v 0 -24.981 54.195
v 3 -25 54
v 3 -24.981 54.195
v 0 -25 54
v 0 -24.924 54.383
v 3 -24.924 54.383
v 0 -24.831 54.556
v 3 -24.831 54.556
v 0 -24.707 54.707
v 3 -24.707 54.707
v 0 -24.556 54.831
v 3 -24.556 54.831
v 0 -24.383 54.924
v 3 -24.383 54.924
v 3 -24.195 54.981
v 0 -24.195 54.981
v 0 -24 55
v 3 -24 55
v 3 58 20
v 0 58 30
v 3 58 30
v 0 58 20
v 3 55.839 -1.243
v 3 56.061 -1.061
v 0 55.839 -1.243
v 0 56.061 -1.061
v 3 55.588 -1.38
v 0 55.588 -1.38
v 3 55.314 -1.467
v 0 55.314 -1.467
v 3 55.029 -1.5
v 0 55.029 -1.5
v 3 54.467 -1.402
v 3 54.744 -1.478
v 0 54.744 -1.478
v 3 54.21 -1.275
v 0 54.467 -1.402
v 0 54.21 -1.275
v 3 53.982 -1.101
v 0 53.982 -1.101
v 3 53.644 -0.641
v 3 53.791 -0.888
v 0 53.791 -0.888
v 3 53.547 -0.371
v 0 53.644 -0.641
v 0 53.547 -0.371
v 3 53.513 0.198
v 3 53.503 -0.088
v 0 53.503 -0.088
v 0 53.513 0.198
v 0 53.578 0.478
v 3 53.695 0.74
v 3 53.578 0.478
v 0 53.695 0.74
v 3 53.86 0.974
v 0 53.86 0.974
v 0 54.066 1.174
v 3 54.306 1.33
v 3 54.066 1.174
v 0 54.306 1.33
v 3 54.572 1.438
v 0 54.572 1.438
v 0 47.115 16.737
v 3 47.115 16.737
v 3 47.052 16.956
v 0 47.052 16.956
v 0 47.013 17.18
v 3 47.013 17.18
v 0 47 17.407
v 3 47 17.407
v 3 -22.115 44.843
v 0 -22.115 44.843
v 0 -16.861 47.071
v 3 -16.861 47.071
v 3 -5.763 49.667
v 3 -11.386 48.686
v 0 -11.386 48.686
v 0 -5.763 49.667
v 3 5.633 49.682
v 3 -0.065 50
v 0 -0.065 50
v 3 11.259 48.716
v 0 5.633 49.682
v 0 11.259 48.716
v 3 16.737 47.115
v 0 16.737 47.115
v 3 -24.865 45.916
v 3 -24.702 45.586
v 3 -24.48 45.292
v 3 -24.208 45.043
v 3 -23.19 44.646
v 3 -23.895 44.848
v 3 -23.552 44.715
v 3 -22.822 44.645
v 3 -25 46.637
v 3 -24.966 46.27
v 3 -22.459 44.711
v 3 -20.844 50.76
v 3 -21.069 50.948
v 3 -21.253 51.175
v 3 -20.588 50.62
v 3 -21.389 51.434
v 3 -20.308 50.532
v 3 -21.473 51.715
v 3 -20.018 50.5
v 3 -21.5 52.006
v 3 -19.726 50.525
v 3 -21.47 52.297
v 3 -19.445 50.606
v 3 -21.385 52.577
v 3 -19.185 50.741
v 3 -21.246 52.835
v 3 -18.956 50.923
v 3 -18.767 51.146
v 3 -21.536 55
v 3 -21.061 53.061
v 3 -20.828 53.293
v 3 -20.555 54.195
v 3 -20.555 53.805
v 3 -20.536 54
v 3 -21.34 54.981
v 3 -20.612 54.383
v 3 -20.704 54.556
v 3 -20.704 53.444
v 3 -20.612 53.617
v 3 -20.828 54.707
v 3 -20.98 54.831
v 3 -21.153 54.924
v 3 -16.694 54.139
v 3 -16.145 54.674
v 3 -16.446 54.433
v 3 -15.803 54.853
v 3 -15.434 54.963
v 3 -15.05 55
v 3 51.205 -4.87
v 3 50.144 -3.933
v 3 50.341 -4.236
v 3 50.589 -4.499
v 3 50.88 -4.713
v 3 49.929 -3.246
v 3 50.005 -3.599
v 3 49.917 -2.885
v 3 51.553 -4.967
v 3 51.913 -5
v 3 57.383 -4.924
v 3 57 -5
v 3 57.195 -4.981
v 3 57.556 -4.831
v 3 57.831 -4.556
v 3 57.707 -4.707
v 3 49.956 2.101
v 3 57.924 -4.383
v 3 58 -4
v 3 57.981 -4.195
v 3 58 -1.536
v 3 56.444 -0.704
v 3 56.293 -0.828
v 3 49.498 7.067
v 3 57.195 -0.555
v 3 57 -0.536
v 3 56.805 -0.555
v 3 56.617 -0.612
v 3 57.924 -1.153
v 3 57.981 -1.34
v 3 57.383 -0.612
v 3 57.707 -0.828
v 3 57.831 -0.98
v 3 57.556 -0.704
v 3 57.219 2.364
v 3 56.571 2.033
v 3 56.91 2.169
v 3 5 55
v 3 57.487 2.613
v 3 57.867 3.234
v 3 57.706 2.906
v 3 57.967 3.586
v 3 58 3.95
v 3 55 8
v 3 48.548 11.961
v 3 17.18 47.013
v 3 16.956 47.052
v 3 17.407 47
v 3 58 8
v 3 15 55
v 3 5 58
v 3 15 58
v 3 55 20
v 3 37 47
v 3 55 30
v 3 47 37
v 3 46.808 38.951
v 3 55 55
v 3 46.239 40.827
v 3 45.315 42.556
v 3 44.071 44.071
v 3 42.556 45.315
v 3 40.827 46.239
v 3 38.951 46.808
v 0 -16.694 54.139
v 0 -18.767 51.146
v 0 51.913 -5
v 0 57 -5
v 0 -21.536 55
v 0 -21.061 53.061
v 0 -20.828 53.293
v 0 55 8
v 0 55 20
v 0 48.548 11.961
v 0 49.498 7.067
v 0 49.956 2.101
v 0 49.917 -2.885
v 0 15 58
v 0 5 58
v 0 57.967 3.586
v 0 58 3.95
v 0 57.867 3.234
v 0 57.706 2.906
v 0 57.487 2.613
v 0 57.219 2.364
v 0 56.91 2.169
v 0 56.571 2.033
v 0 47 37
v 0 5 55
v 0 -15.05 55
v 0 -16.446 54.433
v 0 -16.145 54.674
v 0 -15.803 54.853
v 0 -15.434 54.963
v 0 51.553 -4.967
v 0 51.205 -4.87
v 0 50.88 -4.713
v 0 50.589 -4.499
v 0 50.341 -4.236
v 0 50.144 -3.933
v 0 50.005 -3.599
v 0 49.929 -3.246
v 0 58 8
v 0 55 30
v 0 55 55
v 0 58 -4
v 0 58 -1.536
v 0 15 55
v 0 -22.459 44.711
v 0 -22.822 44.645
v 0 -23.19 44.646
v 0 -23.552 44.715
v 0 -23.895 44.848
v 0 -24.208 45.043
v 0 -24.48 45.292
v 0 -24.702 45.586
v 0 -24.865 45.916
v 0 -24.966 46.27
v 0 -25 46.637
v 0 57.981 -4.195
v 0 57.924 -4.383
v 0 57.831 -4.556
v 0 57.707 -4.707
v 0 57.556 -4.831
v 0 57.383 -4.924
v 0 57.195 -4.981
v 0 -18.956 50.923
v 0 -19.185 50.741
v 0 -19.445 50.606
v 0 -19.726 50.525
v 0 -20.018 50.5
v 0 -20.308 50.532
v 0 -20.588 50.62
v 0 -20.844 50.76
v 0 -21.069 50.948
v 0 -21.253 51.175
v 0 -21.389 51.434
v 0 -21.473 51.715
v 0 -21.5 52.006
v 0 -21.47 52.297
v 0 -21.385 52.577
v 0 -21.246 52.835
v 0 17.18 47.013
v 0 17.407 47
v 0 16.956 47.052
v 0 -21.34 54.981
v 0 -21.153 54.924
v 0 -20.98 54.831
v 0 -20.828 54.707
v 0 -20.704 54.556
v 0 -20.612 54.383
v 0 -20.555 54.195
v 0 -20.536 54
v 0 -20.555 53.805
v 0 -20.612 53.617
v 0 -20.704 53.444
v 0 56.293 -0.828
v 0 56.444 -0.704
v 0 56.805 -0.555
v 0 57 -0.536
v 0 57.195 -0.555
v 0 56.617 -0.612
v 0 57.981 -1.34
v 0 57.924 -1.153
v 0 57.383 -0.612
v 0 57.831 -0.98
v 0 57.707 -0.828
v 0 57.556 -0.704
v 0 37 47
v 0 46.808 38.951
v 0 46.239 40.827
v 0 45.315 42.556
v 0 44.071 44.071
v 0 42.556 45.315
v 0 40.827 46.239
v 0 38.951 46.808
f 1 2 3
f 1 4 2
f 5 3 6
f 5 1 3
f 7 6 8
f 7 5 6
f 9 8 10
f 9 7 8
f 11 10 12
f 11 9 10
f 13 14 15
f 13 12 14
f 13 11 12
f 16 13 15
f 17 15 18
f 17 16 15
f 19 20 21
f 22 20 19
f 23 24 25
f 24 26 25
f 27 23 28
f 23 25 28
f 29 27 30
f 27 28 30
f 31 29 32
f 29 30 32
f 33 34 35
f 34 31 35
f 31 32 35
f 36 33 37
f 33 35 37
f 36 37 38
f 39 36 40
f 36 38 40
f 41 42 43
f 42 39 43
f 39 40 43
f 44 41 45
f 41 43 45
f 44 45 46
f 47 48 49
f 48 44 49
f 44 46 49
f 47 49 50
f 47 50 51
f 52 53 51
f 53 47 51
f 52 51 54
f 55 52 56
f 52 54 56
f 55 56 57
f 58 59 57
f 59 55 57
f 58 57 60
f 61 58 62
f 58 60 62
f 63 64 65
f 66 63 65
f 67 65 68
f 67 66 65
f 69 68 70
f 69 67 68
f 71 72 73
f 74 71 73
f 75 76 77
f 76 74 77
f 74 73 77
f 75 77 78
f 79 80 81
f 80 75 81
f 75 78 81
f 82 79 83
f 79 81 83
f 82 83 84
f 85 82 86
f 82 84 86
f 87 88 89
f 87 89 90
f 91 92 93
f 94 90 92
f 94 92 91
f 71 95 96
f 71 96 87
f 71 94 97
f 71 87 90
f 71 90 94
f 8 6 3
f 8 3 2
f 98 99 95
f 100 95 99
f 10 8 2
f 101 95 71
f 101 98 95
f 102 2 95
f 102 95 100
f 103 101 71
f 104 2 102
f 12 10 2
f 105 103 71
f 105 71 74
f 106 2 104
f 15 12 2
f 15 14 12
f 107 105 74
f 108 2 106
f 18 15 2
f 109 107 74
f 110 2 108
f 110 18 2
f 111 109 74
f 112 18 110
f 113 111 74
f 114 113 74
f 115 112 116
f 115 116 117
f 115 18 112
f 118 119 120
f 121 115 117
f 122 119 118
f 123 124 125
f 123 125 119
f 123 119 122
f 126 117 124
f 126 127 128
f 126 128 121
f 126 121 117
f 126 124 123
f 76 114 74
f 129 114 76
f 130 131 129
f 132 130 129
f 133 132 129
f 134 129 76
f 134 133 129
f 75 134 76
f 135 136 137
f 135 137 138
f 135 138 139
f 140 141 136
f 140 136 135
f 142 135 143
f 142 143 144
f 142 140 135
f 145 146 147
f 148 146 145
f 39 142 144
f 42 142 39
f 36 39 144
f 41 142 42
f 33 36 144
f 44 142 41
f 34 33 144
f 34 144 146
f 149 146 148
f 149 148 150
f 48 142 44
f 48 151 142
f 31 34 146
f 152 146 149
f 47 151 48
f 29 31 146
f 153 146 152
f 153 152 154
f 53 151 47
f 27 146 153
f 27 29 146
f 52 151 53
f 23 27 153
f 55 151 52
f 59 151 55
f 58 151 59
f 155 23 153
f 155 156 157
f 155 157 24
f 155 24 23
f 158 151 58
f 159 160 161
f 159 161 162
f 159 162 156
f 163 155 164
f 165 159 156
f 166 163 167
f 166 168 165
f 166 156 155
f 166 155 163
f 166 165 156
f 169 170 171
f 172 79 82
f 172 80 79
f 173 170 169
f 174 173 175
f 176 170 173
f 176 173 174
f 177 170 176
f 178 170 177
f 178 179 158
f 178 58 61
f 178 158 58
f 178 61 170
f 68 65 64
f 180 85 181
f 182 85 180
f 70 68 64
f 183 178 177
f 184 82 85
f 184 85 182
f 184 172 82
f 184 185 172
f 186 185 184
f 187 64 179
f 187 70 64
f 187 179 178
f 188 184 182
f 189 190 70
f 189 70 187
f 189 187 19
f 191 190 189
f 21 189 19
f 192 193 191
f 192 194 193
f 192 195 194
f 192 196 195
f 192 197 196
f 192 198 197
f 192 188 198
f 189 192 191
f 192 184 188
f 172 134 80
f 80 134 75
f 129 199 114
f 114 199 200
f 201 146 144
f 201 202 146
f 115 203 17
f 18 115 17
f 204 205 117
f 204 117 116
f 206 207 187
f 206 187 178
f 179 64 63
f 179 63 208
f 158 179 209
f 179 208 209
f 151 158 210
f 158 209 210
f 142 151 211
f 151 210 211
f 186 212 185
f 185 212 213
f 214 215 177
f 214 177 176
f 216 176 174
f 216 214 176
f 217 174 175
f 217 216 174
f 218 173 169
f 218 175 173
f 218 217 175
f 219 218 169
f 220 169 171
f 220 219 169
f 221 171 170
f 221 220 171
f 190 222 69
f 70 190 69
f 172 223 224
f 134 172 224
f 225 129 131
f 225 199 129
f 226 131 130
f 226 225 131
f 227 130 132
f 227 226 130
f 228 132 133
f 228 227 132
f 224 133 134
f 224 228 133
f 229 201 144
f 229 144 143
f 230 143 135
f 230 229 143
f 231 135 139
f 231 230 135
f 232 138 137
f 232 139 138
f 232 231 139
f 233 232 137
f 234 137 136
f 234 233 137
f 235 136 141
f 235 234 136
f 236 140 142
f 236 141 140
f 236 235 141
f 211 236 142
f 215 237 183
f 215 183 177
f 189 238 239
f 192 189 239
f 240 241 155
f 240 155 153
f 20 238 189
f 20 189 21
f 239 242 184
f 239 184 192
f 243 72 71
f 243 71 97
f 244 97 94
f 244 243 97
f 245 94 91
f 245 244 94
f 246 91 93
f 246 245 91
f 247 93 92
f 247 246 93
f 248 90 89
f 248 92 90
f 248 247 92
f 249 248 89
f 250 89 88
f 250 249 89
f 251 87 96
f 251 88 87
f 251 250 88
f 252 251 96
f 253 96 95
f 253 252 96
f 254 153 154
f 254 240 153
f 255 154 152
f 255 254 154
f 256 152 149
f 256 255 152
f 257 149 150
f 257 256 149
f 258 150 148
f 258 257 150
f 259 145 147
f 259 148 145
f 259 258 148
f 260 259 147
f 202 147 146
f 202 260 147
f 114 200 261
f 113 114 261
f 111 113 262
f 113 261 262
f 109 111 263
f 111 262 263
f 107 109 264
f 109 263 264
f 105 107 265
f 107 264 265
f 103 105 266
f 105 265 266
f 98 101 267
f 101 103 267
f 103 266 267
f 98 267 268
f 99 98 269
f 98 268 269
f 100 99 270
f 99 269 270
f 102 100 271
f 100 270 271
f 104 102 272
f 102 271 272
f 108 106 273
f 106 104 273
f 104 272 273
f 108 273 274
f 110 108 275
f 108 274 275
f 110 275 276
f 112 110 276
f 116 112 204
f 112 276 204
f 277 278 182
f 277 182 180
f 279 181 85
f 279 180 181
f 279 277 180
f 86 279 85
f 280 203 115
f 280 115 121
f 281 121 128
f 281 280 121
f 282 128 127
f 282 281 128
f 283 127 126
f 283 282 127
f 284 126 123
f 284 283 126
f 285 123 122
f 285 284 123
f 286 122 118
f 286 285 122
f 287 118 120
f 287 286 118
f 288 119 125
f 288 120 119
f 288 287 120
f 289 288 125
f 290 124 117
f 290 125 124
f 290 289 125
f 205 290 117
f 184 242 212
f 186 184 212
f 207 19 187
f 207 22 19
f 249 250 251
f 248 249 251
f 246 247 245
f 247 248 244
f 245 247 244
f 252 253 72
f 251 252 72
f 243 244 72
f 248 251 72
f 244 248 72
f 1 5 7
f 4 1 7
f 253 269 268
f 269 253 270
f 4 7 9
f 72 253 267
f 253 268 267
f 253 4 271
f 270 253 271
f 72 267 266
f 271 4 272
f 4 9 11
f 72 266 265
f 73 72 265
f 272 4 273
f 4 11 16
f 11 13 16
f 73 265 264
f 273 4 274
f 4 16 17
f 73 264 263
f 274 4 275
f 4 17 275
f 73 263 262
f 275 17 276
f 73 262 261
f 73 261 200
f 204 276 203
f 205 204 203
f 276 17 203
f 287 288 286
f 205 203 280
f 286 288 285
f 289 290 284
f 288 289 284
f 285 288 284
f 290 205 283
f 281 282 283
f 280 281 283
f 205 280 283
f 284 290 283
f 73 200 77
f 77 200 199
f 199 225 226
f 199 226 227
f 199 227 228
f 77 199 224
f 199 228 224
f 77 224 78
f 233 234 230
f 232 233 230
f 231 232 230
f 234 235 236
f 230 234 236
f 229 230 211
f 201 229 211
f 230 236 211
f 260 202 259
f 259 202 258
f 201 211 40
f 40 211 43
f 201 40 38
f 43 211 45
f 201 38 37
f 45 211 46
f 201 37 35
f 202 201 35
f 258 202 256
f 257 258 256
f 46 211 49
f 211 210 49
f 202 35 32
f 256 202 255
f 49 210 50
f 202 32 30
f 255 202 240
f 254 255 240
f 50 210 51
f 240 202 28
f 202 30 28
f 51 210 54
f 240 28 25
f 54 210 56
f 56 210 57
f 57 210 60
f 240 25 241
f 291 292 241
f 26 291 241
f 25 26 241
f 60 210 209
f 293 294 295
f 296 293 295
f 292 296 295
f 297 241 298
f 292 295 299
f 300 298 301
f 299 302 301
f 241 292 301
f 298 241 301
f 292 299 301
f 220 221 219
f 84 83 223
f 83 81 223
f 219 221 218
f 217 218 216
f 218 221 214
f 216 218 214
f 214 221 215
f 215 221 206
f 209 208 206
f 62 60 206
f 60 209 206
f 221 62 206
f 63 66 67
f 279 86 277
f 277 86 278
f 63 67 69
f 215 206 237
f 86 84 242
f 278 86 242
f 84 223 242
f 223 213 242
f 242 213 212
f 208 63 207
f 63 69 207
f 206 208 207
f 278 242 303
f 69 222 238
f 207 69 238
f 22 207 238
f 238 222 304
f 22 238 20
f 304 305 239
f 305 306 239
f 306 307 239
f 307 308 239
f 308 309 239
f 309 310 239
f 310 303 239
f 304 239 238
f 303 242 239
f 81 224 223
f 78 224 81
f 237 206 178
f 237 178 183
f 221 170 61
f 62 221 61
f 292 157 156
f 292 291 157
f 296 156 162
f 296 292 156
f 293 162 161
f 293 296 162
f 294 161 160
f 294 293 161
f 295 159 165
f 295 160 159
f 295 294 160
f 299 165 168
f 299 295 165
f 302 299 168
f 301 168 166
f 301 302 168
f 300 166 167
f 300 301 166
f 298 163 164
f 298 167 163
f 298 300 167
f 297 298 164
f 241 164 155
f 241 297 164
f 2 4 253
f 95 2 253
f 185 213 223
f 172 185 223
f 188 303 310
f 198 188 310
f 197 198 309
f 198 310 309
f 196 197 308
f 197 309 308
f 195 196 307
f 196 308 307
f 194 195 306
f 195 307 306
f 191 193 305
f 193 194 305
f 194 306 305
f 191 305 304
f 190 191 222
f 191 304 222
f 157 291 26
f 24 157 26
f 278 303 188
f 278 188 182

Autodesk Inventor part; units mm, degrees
ref_plane "YZ Plane" through (0, 0, 0) normal (1, 0, 0) x (0, 1, 0)
ref_plane "XZ Plane" through (0, 0, 0) normal (0, 1, 0) x (-1, 0, 0)
ref_plane "XY Plane" through (0, 0, 0) normal (0, 0, 1) x (1, 0, 0)
sketch "Sketch2" plane through (0, 0, 0) normal (1, 0, 0) x (0, 1, 0)
  line L0 (55, 30) -> (58, 30)
  line L1 (58, 30) -> (58, 20)
  line L2 (58, 20) -> (55, 20)
  line L3 (15, 55) -> (15, 58)
  line L4 (15, 58) -> (5, 58)
  line L5 (5, 58) -> (5, 55)
  line L6 (55, 30) -> (55, 55)
  line L7 (15, 55) -> (55, 55)
  line L8 (55, 20) -> (55, 8)
  line L9 (55, 8) -> (58, 8)
  arc A0 (54.5719, 1.4376) -> (56.0607, -1.0607) centre (55, 0) ccw
  line L10 (57, -5) -> (51.9134, -5)
  line L11 (56.5709, 2.033) -> (54.5719, 1.4376)
  line L12 (56.2929, -0.8284) -> (56.0607, -1.0607)
  line L13 (58, 8) -> (58, 3.9497)
  line L14 (58, -1.5355) -> (58, -4)
  arc A1 (56.5709, 2.033) -> (58, 3.9497) centre (56, 3.9497) ccw
  arc A2 (58, -1.5355) -> (56.2929, -0.8284) centre (57, -1.5355) ccw
  arc A3 (57, -5) -> (58, -4) centre (57, -4) ccw
  line L15 (-25, 54) -> (-25, 46.6369)
  arc A4 (-21.0607, 53.0607) -> (-18.7668, 51.146) centre (-20, 52) ccw
  line L16 (-20.8284, 53.2929) -> (-21.0607, 53.0607)
  line L17 (-16.6945, 54.1386) -> (-18.7668, 51.146)
  line L18 (5, 55) -> (-15.0503, 55)
  line L19 (-21.5355, 55) -> (-24, 55)
  arc A5 (-15.0503, 55) -> (-16.6945, 54.1386) centre (-15.0503, 53) ccw
  arc A6 (-25, 46.6369) -> (-22.1154, 44.8432) centre (-23, 46.6369) ccw
  arc A7 (-24, 55) -> (-25, 54) centre (-24, 54) ccw
  arc A8 (-20.8284, 53.2929) -> (-21.5355, 55) centre (-21.5355, 54) ccw
  arc A9 (49.9167, -2.8846) -> (47.1154, 16.7374) centre (0, 0) ccw
  arc A10 (16.7374, 47.1154) -> (-22.1154, 44.8432) centre (0, 0) ccw
  arc A11 (49.9167, -2.8846) -> (51.9134, -5) centre (51.9134, -3) ccw
  line L20 (47, 37) -> (47, 17.4069)
  line L21 (37, 47) -> (17.4069, 47)
  arc A12 (47, 17.4069) -> (47.1154, 16.7374) centre (49, 17.4069) ccw
  arc A13 (16.7374, 47.1154) -> (17.4069, 47) centre (17.4069, 49) ccw
  arc A14 (47, 37) -> (37, 47) centre (37, 37) ccw
  point P0 (-29.1247, 40.6418)
  point P1 (45.8258, -20)
  point P2 (49.96, -5)
  point P3 (-25, 43.3013)
  point P4 (58, -5)
  point P5 (-25, 55)
  point P6 (21.7945, 45)
  point P7 (45, 21.7945)
  point P8 (17.0587, 47)
  point P9 (47, 17.0587)
  point P10 (49.7494, -5)
  dimension "d5" = 10
  dimension "d6" = 10
  dimension "d13" = 40
  dimension "d14" = 25
  dimension "d15" = 3
  dimension "d16" = 3
  dimension "d22" = 55
  dimension "d23" = 55
  dimension "d43" = 12
  dimension "d44" = 3
  dimension "d46" = 3
  dimension "d48" = 3
  dimension "d53" = 2
  dimension "d54" = 1
  dimension "d57" = 80
  dimension "d58" = 3
  dimension "d59" = 5
  dimension "d61" = 3
  dimension "d64" = 2
  dimension "d65" = 2
  dimension "d66" = 1
  dimension "d67" = 3
  dimension "d75" = 4.0503
  dimension "d76" = 60
  dimension "d77" = 2
  dimension "d78" = 5
  dimension "d79" = 3
  dimension "d82" = 8
  dimension "d83" = 2
  dimension "d84" = 10
extrude "Extrusion3" add sketch "Sketch2" along normal blind 3
properties part number "OpenROV 2_2a Tube Brace"
